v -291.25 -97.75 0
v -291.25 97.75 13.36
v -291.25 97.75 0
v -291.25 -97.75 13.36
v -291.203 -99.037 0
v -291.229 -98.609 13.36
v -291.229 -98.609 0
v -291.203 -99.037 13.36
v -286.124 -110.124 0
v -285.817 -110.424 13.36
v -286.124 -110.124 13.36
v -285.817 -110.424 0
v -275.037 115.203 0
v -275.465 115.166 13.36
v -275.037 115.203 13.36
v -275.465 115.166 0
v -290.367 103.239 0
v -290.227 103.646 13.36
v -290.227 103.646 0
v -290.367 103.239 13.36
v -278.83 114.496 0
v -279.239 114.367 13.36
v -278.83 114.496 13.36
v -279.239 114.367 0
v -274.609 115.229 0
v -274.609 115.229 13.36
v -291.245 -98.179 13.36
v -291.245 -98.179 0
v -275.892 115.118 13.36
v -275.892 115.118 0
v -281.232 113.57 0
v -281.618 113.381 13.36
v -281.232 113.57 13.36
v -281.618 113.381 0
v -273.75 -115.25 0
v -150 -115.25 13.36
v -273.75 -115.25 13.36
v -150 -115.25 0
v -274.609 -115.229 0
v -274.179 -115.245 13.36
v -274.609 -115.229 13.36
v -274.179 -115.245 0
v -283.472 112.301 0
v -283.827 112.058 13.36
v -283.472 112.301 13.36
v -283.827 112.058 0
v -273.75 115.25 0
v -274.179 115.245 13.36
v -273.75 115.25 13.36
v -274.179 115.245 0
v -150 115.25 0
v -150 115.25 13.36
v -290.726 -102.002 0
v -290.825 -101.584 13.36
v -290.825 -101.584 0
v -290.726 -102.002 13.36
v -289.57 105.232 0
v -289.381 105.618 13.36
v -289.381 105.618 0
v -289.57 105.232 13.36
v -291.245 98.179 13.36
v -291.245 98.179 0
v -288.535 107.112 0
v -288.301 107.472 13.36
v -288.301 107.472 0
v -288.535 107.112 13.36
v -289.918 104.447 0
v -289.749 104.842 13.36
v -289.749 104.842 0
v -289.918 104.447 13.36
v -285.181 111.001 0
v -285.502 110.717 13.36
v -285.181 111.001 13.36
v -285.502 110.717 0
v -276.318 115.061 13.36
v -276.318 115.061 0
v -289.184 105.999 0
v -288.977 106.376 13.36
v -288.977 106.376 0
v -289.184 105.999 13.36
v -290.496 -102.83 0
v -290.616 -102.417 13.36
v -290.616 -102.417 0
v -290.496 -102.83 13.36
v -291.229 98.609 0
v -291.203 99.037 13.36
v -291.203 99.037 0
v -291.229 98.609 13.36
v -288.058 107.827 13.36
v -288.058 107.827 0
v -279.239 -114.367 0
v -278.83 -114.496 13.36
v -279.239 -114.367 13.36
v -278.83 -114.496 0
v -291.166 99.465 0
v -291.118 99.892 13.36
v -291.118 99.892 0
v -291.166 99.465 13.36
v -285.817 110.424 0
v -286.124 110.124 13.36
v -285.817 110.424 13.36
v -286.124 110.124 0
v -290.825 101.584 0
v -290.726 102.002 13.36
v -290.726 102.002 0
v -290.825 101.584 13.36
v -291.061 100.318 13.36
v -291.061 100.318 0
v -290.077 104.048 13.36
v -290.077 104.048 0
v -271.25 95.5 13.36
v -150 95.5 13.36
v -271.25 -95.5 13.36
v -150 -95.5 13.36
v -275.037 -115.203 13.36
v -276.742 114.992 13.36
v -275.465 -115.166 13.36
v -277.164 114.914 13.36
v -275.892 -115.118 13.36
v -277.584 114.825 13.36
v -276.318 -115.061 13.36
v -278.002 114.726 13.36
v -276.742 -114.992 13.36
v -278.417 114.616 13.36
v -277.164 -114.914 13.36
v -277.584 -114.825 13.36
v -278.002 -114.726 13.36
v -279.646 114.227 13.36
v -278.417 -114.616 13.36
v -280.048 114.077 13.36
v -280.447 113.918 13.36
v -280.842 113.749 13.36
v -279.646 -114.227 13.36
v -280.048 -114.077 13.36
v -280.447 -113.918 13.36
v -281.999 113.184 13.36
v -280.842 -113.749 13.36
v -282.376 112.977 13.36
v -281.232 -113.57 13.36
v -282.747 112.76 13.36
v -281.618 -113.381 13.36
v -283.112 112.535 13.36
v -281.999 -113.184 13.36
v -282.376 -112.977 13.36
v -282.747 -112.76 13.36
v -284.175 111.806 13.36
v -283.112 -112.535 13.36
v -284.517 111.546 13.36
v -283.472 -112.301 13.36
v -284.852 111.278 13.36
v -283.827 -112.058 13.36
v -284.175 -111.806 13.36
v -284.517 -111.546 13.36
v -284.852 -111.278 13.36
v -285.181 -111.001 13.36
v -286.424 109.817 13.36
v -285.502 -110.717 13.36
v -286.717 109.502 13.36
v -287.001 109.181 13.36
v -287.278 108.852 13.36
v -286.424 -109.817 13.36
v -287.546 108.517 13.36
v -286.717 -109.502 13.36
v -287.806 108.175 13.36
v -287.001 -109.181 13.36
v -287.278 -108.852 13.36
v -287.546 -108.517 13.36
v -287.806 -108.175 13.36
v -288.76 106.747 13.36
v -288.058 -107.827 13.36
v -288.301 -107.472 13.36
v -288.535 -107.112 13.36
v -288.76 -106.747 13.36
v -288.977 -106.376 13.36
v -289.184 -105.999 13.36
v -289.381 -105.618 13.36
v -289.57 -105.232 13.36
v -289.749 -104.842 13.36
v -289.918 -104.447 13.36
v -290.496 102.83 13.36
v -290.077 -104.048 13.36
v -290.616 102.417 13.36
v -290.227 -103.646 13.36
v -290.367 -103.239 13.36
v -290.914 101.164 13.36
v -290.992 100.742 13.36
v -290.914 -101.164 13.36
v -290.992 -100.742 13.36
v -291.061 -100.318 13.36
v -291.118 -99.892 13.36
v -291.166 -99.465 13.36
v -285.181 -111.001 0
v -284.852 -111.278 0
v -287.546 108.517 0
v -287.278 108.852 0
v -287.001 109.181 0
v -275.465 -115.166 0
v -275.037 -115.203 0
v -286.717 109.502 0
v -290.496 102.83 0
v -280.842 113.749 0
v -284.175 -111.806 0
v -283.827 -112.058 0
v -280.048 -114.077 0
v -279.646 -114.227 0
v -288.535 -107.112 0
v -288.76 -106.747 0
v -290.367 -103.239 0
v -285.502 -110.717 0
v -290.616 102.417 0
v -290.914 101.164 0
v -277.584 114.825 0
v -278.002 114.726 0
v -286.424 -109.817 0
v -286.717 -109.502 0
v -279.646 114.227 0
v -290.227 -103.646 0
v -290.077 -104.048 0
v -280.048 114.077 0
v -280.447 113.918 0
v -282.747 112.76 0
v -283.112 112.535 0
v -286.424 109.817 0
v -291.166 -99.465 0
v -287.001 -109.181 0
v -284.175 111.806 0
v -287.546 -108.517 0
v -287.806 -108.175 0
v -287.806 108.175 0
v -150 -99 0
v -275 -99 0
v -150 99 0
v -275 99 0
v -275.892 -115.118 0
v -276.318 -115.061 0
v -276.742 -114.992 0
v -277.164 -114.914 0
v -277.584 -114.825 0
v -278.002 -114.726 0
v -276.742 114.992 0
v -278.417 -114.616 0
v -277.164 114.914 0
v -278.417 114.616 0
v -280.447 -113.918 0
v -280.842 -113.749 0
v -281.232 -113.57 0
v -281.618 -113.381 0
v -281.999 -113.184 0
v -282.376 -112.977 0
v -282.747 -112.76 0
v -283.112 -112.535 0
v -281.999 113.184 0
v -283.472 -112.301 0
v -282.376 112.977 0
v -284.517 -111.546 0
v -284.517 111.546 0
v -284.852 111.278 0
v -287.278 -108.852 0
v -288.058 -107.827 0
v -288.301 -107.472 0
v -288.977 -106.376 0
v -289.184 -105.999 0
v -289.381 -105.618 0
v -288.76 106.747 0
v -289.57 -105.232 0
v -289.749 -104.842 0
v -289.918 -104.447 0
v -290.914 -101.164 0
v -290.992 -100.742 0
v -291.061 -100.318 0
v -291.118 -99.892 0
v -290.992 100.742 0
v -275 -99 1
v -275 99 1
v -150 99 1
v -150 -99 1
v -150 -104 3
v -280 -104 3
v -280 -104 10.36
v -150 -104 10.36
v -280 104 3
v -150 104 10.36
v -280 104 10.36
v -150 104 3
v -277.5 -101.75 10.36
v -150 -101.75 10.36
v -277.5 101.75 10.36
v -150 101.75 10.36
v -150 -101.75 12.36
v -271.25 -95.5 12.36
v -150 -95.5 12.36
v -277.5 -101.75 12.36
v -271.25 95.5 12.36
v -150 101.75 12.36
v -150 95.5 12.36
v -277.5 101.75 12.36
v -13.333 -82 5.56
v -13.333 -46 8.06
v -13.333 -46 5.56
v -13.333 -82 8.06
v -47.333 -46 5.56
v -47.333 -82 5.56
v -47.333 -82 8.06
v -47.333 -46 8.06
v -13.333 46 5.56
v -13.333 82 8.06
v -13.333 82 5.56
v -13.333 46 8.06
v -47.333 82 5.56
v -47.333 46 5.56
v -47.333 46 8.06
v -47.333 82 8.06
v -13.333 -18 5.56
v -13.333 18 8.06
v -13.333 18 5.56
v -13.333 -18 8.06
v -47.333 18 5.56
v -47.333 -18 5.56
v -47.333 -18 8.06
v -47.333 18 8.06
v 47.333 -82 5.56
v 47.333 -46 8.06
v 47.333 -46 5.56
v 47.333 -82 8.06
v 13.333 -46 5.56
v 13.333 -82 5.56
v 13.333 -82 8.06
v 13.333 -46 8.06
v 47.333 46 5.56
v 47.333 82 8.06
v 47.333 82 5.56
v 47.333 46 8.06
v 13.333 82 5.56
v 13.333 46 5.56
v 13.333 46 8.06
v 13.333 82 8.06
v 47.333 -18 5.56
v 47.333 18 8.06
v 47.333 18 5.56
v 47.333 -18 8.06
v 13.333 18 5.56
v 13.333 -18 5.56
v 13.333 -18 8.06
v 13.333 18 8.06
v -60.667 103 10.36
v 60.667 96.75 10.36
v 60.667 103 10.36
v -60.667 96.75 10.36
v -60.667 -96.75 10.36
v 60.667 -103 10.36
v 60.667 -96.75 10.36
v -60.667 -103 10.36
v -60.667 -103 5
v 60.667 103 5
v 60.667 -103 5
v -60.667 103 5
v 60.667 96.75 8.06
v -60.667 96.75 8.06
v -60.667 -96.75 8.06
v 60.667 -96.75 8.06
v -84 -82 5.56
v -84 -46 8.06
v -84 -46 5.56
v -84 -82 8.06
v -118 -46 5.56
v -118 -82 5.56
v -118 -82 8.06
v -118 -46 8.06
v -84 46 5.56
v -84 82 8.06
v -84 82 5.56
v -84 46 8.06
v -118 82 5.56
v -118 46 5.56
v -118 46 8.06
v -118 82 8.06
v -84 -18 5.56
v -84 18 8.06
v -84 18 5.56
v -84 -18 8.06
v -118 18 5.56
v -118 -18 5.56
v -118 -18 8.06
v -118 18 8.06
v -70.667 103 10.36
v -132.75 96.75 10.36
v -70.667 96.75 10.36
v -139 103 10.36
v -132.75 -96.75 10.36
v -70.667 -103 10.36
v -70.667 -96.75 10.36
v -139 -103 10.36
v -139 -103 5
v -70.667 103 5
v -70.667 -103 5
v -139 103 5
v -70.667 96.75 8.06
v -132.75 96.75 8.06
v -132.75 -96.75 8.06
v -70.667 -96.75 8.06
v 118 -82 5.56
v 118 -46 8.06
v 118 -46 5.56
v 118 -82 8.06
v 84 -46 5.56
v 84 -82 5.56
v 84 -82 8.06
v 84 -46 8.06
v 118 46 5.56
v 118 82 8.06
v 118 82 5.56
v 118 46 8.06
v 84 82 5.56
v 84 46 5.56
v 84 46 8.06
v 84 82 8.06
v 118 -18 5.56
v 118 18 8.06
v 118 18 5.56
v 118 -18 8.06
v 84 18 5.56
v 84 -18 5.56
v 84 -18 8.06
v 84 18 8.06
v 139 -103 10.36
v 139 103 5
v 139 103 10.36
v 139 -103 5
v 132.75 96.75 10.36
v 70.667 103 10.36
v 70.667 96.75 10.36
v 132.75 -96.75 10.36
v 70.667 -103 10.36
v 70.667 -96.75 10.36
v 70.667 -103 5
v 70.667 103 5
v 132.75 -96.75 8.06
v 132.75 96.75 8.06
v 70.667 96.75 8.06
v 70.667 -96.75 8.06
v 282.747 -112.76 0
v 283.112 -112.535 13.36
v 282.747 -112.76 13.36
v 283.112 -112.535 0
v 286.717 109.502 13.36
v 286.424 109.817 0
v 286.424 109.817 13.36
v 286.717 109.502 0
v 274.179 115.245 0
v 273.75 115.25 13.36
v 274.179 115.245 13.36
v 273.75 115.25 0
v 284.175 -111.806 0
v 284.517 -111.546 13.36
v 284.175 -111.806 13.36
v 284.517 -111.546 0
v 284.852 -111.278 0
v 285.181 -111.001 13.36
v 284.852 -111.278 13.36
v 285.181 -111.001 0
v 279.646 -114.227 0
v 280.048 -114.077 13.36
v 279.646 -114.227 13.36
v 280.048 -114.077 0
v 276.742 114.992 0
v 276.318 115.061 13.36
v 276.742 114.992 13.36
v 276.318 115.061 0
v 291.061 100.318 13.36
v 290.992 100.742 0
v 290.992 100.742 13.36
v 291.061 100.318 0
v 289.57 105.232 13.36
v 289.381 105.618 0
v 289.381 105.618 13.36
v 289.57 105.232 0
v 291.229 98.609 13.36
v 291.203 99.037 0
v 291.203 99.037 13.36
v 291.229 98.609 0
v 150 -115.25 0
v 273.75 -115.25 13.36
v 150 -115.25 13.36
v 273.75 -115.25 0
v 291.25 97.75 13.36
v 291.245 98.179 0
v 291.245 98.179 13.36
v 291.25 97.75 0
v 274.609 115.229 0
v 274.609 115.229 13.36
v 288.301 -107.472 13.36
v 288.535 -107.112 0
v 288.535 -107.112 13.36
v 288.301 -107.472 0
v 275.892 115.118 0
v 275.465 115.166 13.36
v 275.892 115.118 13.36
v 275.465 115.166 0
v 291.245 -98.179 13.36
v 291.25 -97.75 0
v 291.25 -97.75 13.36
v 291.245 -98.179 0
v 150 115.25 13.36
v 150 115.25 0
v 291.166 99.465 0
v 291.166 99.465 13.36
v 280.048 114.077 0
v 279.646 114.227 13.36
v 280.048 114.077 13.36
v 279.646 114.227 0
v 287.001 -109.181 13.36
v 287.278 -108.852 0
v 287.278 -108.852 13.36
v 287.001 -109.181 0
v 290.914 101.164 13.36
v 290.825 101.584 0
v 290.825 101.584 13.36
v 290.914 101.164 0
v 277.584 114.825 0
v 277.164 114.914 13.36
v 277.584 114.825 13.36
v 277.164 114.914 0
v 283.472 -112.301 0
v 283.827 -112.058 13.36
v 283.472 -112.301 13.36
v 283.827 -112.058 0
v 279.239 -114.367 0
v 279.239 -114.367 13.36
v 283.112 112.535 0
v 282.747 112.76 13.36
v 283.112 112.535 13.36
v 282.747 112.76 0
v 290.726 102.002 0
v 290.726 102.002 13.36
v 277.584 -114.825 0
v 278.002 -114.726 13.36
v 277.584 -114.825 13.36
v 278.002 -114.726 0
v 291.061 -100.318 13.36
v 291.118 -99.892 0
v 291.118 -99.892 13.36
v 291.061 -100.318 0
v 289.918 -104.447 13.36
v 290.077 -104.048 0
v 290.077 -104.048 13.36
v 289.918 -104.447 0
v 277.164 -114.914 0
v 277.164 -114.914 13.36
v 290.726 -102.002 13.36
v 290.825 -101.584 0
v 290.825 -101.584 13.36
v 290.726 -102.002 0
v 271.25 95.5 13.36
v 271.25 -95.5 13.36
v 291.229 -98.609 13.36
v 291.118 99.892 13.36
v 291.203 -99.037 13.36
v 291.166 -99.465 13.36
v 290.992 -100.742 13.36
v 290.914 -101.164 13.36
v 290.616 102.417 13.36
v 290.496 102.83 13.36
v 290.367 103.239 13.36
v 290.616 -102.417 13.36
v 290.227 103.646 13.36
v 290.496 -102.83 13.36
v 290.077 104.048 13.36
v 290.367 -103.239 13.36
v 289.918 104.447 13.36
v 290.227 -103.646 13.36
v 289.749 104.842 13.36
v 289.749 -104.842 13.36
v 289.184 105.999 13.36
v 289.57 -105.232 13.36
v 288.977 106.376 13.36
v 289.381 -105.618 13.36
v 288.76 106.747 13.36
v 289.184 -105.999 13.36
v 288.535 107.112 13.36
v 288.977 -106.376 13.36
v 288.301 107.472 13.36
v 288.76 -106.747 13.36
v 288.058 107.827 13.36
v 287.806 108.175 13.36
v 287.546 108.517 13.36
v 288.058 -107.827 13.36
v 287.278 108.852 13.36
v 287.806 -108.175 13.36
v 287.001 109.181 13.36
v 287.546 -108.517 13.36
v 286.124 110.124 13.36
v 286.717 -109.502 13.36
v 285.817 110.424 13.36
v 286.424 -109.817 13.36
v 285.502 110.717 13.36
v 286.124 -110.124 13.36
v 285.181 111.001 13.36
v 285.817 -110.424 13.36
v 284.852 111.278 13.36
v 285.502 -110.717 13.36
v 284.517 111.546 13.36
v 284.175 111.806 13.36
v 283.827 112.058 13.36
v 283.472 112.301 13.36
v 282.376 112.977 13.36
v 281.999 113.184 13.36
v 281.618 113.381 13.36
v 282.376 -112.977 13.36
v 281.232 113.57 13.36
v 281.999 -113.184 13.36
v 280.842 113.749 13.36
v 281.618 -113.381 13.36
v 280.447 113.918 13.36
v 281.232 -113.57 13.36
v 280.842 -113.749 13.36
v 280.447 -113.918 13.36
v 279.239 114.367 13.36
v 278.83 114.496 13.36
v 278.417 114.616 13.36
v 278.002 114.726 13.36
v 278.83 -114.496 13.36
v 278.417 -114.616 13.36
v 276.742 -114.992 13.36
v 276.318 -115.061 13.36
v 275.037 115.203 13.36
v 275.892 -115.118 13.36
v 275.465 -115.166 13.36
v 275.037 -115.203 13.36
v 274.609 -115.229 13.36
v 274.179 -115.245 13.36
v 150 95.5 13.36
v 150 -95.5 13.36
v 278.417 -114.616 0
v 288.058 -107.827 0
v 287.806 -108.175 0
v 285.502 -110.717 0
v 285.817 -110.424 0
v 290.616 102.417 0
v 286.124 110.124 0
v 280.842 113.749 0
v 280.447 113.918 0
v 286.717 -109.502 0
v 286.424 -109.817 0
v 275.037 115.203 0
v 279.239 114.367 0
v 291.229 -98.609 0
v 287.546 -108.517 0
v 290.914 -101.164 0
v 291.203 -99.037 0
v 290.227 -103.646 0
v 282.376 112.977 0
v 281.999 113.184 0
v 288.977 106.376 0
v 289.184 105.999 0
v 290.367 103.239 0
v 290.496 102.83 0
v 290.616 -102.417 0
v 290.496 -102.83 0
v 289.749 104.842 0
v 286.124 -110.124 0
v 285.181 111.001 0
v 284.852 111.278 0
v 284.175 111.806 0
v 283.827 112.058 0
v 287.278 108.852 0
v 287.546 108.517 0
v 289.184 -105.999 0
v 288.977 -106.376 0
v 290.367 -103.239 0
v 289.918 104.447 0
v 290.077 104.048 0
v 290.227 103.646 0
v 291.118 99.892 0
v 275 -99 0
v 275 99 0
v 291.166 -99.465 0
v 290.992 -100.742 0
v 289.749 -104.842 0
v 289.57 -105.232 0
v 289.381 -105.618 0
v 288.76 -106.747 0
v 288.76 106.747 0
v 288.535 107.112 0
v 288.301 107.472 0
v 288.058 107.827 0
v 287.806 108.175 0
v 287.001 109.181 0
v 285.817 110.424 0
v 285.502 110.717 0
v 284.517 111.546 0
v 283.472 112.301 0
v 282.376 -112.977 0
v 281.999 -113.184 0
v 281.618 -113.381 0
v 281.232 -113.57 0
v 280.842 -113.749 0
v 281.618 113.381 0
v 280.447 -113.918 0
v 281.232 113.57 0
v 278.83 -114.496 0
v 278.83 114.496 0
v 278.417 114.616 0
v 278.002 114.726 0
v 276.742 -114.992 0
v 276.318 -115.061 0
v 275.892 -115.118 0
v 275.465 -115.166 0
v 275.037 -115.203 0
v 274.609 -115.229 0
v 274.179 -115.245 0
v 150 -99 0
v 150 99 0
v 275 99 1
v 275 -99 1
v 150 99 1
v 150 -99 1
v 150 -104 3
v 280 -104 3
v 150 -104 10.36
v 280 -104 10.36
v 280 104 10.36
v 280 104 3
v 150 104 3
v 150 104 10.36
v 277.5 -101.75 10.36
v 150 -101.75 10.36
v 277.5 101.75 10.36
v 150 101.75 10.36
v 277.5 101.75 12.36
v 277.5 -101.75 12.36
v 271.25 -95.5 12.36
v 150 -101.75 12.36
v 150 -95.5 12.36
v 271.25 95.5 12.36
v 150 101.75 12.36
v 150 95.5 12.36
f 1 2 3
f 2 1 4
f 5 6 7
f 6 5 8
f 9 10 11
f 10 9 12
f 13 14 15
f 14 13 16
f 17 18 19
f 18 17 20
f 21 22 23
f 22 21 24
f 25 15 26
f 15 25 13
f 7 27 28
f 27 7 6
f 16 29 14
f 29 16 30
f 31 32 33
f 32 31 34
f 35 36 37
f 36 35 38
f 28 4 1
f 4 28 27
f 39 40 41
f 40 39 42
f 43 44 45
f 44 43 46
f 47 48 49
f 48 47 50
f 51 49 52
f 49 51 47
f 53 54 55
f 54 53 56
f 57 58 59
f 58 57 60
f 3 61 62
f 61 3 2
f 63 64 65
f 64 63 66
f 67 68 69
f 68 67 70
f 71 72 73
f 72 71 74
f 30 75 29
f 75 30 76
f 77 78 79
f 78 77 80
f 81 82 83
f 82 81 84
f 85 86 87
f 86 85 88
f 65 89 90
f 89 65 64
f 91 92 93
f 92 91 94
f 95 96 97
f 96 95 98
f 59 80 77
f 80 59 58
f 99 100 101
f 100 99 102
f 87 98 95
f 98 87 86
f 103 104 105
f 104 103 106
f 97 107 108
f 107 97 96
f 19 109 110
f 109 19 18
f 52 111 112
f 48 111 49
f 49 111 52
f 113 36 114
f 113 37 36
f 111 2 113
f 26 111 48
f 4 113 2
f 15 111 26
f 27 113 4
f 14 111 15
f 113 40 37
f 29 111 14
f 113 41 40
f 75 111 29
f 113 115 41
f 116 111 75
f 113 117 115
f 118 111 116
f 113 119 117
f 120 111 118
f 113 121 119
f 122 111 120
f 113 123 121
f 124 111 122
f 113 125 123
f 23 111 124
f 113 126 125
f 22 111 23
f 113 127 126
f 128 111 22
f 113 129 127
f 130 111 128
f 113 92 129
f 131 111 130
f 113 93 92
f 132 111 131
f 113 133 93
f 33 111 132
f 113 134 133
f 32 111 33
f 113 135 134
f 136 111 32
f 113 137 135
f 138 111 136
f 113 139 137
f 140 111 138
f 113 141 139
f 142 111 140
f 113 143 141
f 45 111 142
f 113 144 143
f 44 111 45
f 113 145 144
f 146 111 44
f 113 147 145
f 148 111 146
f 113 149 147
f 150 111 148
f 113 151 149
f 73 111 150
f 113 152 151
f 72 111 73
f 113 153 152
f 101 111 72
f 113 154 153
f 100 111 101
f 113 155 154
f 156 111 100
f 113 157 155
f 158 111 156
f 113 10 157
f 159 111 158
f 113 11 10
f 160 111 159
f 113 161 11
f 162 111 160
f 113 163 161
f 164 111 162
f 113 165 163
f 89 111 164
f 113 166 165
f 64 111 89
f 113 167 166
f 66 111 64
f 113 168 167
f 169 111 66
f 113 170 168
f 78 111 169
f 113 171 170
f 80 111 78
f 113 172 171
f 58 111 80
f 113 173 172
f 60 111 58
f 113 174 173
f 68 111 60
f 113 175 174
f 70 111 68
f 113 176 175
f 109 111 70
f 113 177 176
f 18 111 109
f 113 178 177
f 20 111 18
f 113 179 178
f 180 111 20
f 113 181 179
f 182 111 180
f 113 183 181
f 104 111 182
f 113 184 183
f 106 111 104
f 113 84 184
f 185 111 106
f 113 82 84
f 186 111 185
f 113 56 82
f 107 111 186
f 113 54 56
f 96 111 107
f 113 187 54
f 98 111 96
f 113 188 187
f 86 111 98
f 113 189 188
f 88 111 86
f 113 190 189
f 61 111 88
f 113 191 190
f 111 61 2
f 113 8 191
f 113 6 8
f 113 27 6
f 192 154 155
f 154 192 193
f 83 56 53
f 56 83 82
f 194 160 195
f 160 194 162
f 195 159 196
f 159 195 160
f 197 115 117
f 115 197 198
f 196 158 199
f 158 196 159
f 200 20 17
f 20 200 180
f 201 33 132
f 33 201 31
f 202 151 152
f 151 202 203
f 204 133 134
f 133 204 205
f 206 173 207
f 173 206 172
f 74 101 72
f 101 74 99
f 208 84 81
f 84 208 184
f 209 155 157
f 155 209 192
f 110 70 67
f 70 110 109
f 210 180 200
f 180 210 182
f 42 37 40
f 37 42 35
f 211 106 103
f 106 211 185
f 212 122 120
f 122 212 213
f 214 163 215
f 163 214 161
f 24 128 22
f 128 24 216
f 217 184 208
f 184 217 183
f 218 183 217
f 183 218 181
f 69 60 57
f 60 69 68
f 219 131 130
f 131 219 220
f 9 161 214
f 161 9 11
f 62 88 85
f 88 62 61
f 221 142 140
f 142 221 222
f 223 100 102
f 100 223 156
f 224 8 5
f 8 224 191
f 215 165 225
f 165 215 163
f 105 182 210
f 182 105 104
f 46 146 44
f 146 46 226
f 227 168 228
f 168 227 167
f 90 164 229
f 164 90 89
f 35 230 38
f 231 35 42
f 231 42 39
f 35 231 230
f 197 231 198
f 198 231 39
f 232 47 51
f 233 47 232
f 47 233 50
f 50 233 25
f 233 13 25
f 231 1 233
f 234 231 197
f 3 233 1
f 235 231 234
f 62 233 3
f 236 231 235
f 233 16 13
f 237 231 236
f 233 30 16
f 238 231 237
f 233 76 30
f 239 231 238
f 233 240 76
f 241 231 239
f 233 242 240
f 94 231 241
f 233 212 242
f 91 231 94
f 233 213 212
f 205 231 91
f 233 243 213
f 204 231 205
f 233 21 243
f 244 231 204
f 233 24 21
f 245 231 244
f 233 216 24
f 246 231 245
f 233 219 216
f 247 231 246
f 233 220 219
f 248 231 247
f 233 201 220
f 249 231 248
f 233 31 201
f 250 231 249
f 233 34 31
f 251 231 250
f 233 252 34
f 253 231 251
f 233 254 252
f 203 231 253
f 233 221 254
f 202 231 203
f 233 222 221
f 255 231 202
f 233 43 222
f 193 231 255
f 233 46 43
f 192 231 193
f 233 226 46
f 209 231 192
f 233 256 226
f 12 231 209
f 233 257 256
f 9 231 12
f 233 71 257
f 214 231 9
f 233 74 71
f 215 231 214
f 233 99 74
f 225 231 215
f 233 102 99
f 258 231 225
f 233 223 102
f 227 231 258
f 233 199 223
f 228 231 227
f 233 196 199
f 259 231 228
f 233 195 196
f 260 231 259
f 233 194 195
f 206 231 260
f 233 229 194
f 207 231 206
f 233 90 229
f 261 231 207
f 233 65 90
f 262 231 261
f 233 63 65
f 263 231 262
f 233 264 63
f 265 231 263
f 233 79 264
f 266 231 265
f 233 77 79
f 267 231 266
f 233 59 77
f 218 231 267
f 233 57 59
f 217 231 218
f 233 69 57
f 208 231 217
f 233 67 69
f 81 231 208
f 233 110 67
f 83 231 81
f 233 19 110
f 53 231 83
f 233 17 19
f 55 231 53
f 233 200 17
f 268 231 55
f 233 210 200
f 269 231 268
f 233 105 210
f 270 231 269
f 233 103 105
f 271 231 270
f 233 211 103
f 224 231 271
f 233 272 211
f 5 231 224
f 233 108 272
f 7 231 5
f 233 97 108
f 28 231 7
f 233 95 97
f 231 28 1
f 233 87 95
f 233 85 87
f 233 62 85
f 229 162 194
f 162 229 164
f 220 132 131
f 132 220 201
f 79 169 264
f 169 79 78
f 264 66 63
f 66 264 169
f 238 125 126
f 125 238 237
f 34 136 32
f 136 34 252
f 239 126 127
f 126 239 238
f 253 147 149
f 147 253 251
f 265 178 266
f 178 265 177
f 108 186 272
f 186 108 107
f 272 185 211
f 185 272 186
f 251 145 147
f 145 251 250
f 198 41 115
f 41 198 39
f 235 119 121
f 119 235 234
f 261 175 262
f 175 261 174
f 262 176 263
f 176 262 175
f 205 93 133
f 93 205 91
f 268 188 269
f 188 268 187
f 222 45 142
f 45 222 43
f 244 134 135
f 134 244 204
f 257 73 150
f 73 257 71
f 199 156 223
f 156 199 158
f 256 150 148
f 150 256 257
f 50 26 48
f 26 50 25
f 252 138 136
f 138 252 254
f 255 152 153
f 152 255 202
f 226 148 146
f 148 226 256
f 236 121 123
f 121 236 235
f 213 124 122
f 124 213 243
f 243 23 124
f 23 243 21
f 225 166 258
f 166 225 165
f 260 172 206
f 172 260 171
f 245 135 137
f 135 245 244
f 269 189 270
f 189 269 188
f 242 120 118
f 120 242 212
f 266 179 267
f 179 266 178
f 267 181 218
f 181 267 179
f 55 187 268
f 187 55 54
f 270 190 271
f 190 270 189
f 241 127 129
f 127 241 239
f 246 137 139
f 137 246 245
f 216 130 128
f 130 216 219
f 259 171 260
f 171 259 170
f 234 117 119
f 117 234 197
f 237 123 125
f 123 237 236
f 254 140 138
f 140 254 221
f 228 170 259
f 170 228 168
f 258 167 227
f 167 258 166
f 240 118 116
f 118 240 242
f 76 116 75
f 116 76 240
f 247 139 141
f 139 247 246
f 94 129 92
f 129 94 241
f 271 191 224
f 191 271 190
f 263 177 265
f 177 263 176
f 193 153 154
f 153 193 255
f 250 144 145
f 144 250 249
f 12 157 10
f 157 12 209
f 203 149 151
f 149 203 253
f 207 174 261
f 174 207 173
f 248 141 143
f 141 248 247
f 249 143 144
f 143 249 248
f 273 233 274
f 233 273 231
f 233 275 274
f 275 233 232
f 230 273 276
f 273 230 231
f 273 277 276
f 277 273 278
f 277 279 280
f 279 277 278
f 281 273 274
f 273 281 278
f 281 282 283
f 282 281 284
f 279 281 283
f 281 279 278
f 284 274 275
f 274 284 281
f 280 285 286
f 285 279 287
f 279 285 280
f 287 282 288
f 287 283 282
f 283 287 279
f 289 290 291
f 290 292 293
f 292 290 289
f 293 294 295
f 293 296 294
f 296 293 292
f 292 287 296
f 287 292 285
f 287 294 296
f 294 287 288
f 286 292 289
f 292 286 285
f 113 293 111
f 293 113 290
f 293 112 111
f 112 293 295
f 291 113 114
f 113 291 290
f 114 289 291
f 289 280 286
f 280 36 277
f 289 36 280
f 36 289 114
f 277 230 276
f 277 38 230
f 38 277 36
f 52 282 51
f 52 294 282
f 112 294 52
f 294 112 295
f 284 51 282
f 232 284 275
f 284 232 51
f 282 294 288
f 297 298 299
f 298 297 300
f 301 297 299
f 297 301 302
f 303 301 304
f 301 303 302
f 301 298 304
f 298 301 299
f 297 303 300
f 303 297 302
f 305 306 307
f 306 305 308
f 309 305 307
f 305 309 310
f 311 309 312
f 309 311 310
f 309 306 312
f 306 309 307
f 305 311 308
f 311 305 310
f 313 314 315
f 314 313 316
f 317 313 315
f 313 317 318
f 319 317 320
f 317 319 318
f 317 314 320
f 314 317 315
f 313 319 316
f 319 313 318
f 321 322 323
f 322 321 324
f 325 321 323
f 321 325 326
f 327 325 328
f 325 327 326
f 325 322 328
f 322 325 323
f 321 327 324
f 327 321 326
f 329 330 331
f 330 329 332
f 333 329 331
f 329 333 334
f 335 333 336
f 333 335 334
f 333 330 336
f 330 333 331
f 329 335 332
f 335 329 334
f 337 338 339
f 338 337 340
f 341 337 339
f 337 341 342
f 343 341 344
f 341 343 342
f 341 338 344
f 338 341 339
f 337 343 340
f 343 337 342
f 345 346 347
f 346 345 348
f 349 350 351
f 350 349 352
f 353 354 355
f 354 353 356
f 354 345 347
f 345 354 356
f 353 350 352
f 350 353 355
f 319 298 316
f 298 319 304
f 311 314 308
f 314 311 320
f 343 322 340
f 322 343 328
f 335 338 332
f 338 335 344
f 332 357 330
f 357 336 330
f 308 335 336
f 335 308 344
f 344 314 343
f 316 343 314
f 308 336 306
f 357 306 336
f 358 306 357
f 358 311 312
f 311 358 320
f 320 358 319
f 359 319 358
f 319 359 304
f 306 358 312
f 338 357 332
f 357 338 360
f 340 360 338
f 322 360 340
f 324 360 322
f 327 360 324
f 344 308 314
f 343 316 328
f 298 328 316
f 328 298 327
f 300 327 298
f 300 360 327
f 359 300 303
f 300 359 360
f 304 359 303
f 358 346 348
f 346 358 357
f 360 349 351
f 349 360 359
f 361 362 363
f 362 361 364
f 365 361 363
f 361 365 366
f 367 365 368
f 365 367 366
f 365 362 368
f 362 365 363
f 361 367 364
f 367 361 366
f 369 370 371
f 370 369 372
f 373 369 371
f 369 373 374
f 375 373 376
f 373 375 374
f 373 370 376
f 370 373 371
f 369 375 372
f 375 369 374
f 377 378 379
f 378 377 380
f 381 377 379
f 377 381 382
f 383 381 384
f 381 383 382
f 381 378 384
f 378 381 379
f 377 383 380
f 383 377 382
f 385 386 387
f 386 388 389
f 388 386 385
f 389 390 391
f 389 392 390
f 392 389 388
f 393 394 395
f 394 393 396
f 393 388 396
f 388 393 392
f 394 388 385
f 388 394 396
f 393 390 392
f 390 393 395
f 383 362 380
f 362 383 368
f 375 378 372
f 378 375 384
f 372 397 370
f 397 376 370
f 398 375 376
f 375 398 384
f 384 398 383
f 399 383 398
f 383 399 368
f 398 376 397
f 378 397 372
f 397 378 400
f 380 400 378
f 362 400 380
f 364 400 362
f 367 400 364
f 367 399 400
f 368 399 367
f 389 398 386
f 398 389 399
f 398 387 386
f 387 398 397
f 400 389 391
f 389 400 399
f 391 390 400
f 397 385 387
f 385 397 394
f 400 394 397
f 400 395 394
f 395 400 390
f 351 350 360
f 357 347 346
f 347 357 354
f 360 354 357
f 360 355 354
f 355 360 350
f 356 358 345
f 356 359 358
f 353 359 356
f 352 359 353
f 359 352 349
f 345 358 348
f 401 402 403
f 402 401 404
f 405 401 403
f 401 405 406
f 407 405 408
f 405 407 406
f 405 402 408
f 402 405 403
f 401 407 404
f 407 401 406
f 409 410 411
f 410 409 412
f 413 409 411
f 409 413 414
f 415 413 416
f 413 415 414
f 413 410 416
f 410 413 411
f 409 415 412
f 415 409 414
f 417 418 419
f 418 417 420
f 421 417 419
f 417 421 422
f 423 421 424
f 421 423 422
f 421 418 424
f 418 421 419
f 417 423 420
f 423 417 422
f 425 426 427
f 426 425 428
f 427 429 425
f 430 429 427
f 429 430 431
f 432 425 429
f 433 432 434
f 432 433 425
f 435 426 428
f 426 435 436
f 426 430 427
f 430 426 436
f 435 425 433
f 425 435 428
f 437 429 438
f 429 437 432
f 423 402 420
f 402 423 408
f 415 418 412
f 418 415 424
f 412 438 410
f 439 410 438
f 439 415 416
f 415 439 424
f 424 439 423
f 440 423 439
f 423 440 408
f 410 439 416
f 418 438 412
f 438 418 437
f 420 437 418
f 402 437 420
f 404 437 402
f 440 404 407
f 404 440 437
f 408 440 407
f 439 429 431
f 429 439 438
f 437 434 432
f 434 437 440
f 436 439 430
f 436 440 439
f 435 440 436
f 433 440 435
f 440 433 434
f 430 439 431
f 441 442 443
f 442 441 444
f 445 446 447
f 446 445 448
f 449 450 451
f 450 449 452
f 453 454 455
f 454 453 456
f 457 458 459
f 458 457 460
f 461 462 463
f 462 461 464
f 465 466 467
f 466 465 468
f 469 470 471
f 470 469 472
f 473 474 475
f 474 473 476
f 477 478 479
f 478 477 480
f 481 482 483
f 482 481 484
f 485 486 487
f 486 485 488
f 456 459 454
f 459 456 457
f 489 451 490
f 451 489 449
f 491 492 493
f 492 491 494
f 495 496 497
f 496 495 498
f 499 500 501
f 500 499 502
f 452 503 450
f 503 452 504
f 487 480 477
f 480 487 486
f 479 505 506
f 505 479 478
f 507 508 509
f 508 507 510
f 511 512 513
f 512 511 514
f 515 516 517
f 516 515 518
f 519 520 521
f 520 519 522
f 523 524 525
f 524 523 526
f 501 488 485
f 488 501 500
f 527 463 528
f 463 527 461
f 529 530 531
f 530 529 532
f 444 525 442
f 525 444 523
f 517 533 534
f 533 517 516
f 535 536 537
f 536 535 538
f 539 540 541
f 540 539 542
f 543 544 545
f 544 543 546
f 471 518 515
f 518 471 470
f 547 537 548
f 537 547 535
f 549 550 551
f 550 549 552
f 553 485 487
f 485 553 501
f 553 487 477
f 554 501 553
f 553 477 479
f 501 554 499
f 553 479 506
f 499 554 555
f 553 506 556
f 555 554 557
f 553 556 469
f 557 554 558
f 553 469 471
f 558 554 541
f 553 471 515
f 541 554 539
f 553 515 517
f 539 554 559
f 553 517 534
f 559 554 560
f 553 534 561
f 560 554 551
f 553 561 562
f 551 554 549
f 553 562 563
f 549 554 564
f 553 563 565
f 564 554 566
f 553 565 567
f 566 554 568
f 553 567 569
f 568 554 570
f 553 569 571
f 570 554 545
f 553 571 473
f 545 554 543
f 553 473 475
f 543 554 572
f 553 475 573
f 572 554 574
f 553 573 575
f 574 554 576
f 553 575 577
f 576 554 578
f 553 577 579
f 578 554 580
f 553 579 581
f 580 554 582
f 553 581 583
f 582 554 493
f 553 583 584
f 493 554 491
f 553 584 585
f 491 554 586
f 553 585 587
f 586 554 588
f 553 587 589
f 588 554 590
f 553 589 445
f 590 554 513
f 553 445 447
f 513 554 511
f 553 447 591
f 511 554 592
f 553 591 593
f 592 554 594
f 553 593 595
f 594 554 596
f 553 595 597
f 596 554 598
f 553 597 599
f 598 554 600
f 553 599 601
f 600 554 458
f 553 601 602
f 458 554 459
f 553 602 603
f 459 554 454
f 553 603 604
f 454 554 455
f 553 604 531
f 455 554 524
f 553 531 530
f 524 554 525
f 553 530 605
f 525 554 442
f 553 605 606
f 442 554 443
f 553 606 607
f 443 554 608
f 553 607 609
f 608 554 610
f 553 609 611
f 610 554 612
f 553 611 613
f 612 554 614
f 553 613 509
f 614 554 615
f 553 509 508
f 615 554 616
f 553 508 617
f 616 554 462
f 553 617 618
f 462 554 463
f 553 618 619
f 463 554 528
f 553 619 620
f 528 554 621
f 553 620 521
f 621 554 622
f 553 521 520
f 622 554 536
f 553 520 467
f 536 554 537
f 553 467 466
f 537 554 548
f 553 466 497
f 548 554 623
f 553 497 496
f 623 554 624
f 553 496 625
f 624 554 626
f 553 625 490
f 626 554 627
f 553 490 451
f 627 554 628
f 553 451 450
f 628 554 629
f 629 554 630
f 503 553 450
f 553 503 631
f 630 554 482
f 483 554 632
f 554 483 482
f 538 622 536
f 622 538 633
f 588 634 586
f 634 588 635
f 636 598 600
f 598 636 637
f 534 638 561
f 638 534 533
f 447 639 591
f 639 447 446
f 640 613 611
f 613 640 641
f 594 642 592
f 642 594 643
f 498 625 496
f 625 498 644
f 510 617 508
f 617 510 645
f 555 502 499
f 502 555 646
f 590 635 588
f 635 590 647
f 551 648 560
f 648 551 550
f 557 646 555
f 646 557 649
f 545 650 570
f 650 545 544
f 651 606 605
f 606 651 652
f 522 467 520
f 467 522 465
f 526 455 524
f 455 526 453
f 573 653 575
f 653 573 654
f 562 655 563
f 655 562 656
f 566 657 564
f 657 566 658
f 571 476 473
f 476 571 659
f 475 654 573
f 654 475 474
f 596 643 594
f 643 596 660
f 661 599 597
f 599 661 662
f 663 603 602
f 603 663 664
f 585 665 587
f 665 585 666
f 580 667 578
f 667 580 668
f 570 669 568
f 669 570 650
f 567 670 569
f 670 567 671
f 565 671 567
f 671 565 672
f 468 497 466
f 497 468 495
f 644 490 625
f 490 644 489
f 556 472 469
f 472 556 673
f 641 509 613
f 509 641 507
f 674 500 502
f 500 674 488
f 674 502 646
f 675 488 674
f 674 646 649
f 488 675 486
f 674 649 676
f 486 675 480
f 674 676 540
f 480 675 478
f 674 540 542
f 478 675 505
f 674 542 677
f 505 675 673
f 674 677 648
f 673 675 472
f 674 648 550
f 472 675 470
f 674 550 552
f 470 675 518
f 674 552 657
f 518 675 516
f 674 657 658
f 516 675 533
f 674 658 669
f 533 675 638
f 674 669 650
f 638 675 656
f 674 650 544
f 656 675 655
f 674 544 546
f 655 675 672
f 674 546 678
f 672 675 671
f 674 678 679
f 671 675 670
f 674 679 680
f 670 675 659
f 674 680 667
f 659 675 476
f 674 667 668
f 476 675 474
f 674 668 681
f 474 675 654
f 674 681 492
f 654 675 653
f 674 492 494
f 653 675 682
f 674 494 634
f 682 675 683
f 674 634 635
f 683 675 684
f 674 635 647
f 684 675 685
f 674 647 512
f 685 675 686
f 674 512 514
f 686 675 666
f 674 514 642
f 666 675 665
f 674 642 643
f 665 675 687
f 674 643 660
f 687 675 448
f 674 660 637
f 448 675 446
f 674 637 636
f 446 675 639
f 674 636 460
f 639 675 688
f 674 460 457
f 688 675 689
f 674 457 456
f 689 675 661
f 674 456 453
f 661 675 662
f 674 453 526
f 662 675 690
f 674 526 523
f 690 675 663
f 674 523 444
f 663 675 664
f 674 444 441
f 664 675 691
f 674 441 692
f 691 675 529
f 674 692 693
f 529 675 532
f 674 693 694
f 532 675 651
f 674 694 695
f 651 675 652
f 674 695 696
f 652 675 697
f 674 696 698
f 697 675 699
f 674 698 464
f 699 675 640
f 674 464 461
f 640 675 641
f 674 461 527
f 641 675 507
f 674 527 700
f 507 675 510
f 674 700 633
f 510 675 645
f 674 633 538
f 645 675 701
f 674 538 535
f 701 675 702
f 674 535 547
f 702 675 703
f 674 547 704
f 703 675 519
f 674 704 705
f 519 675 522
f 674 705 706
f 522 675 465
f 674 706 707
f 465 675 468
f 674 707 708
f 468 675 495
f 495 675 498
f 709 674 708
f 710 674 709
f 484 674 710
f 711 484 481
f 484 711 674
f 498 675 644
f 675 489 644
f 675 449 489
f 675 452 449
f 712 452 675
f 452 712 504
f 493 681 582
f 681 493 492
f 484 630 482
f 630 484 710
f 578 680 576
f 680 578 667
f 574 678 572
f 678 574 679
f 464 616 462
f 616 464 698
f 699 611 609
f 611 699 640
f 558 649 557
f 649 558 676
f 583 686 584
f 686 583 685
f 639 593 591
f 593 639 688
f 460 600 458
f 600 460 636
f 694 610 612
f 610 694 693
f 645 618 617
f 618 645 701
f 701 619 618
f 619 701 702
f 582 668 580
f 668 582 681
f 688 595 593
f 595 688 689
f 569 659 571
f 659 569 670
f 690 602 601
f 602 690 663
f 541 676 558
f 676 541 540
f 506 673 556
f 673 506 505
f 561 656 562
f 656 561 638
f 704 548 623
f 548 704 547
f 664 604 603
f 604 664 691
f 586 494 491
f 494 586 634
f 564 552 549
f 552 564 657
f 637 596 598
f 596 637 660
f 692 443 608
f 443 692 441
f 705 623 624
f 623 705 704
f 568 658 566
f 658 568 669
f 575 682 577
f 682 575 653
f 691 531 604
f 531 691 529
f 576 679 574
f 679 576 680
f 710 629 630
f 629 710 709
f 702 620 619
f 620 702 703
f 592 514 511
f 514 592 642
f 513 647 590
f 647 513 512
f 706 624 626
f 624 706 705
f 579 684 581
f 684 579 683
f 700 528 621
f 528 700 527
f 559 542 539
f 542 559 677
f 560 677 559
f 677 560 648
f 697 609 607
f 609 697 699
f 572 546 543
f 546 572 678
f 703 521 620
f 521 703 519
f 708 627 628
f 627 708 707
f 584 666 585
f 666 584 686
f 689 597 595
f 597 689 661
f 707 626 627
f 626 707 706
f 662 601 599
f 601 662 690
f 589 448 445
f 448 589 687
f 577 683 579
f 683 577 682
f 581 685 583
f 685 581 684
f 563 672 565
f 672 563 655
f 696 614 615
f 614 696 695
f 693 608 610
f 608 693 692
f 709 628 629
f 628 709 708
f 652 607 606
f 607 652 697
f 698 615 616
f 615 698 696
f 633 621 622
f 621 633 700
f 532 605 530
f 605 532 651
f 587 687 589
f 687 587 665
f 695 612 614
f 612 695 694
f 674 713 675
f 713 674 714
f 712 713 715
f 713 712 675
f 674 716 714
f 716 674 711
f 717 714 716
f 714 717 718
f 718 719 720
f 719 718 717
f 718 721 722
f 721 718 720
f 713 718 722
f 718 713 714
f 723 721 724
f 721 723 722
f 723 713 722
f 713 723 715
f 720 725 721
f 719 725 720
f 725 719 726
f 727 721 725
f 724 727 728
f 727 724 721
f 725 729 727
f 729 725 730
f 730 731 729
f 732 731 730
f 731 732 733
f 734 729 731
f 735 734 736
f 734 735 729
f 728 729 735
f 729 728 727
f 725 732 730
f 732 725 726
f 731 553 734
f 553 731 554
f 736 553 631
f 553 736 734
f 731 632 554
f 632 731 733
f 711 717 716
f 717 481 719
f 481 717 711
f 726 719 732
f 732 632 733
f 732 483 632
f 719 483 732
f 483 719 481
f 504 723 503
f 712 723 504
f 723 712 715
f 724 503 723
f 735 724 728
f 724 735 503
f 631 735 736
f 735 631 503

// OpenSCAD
// file: ../inlays/nintendo_game_boy_cartridge_c_inlay.scad
use <../../utilities/dictionary_get.scad>;

function nintendo_game_boy_cartridge_c_inlay_embed_width_mm() = 57.5;
function nintendo_game_boy_cartridge_c_inlay_embed_height_mm() = 66.25;

/**
 * A Nintendo Game Boy cartridge which does NOT have a notch in the top right
 * corner, compatible with the CGB, AGB and AGS models.
 * @param An array representing a dictionary, containing:
 *        - origin
 *          - x_mm - The origin of the inlay on the X axis, in millimeters.
 *          - y_mm - The origin of the inlay on the Y axis, in millimeters.
 * @return An array describing the inlay.
 */
function nintendo_game_boy_cartridge_c_inlay(settings) =
  let (origin = dictionary_get(settings, "origin"))
  let (origin_x_mm = dictionary_get(origin, "x_mm"))
  let (origin_y_mm = dictionary_get(origin, "y_mm"))
  [
    ["type", "nintendo_game_boy_cartridge_c"],
    [
      "origin",
      [
        ["x_mm", origin_x_mm],
        ["y_mm", origin_y_mm],
      ],
    ],
  ];

module nintendo_game_boy_cartridge_c_inlay(settings, inlay, embed_depth_mm) {
  translate([
    nintendo_game_boy_cartridge_c_inlay_embed_width_mm() / -2,
    nintendo_game_boy_cartridge_c_inlay_embed_height_mm() / -2,
    -embed_depth_mm,
  ]) {
    cube([
      nintendo_game_boy_cartridge_c_inlay_embed_width_mm(),
      nintendo_game_boy_cartridge_c_inlay_embed_height_mm(),
      embed_depth_mm,
    ]);
  };
};
// file: ../inlays/nintendo_game_boy_cartridge_a_or_b_inlay.scad
use <../../utilities/dictionary_get.scad>;

width_mm = 58;
height_mm = 66;

notch_width_mm = 5.175;
notch_height_mm = 3;

retainer_width_mm = 51;
retainer_depth_offset_mm = 1.5;
retainer_height_mm = 3;

/**
 * A Nintendo Game Boy cartridge which has a notch in the top right corner,
 * compatible with the DMG, MGB, CGB, AGB and AGS models.
 * @param An array representing a dictionary, containing:
 *        - origin
 *          - x_mm - The origin of the inlay on the X axis, in millimeters.
 *          - y_mm - The origin of the inlay on the Y axis, in millimeters.
 * @return An array describing the inlay.
 */
function nintendo_game_boy_cartridge_a_or_b_inlay(settings) =
  let (origin = dictionary_get(settings, "origin"))
  let (origin_x_mm = dictionary_get(origin, "x_mm"))
  let (origin_y_mm = dictionary_get(origin, "y_mm"))
  [
    ["type", "nintendo_game_boy_cartridge_a_or_b"],
    [
      "origin",
      [
        ["x_mm", origin_x_mm],
        ["y_mm", origin_y_mm],
      ],
    ],
  ];

module nintendo_game_boy_cartridge_a_or_b_inlay(settings, inlay, embed_depth_mm) {
  difference() {
    translate([0, 0, -embed_depth_mm]) {
      linear_extrude(embed_depth_mm) {
        difference() {
          translate([width_mm / -2, height_mm / -2]) {
            square([width_mm, height_mm]);
          };

          translate([
            width_mm / 2 - notch_width_mm,
            height_mm / 2 - notch_height_mm,
          ]) {
            square([notch_width_mm, notch_height_mm]);
          };
        };
      };
    };

    translate([
      retainer_width_mm / -2,
      height_mm / -2,
      retainer_depth_offset_mm - embed_depth_mm,
    ]) {
      rotate([0, 90, 0]) {
        linear_extrude(retainer_width_mm) {
          polygon([
            [0, 0],
            [retainer_depth_offset_mm - embed_depth_mm, retainer_height_mm],
            [retainer_depth_offset_mm - embed_depth_mm, 0],
          ]);
        };
      };
    };
  };
};
// file: ../utilities/settings.scad
/**
 * The number of millimeters that the glazing lip overlaps the glazing.
 */
function glazing_lip_thickness_mm() = 6.25;

/**
 * The depth of the glazing lip, in millimeters.
 */
function glazing_lip_depth_mm() = 1;

/**
 * The number of millimeters that the backing lip overlaps the backing.
 */
function backing_lip_thickness_mm() = 5;

/**
 * The depth of the backing lip, in millimeters.
 */
function backing_lip_depth_mm() = 3;

/**
 * The depth of slope to the backing lip, in millimeters.
 */
function backing_lip_slope_depth_mm() = 2;

/**
 * The minimum depth of the inlay layer, in millimeters.
 */
function inlay_bottom_depth_mm() = 0.56;

/**
 * The gap between the bottom of the glazing and the top of the displayed items,
 * in millimeters.
 */
function inlay_top_clearance_mm() = 1;

/**
 * The tolerance each side of the inlay in millimeters.
 */
function inlay_side_tolerance_mm() = 1;
// file: ../utilities/inlay_protrusion_depth_mm.scad
use <../../utilities/dictionary_get.scad>;

/**
 * Given an inlay, determines the depth (in millimeters) to which the inlay
 * should protrude from the frame.
 * @param inlay The inlay to measure.
 * @return      The depth (in millimeters) to which the inlay should protrude
 *              from the frame.
 */
function inlay_protrusion_depth_mm(inlay) = dictionary_get
(
  [
    ["nintendo_3ds_game_card", 1.3],
    ["nintendo_ds_game_card", 1.3],
    ["nintendo_game_boy_cartridge", 4],
    ["nintendo_game_boy_cartridge_c", 5],
  ],
  dictionary_get(inlay, "type")
);
// file: ../utilities/inlay_embed_depth_mm.scad
use <../../utilities/dictionary_get.scad>;

/**
 * Given an inlay, determines the depth (in millimeters) to which the inlay
 * should embed into the frame.
 * @param inlay The inlay to measure.
 * @return      The depth (in millimeters) to which the inlay should embed into
 *              the frame.
 */
function inlay_embed_depth_mm(inlay) = dictionary_get
(
  [
    ["nintendo_3ds_game_card", 2.5],
    ["nintendo_ds_game_card", 2.5],
    ["nintendo_game_boy_cartridge", 4],
    ["nintendo_game_boy_cartridge_c", 4],
  ],
  dictionary_get(inlay, "type")
);
// file: ../../utilities/dictionary_get.scad
/**
 * Retrieves a value by its key from an array representing a dictionary.
 * @param dictionary An array representing a dictionary.  Its contents must be
 *                   two-item arrays, each containing a key, then a value.
 * @param key        The key of the value to retrieve.
 * @return           The value matching the specified key.
 * @throws           When the key is not in the dictionary.
 * @throws           When the key is present in the dictionary multiple times.
 */
function dictionary_get(dictionary, key) =
  assert(
    len([for (item = dictionary) if (item[0] == key) item]) >= 1,
    "The given key was not found in the given dictionary"
  )
  assert(
    len([for (item = dictionary) if (item[0] == key) item]) <= 1,
    "The given key was found multiple times in the given dictionary"
  )
  [for (item = dictionary) if (item[0] == key) item][0][1];
// file: ../../utilities/slice_y.scad
module slice_y(bottom, top) {
  intersection() {
    translate([
      -10000,
      bottom,
      -10000,
    ]) {
      cube([
        20000,
        top - bottom,
        20000,
      ]);
    };

    children();
  };
};
// file: ../../utilities/slice_x.scad
module slice_x(left, right) {
  intersection() {
    translate([
      left,
      -10000,
      -10000,
    ]) {
      cube([
        right - left,
        20000,
        20000,
      ]);
    };

    children();
  };
};
// file: ../inlays/nintendo_ds_game_card_inlay.scad
use <../../utilities/dictionary_get.scad>;

function nintendo_ds_game_card_inlay_width_mm() = 34;
function nintendo_ds_game_card_inlay_height_mm() = 36;

/**
 * A Nintendo DS game card (without the Nintendo 3DS tab).  Compatible with the
 * SPR, CTR, FTR, TWL and UTL models (and the un-codenamed "New 3DS" range).
 * Likely compatible with the USG and NTR models.
 * @param An array representing a dictionary, containing:
 *        - origin
 *          - x_mm - The origin of the inlay on the X axis, in millimeters.
 *          - y_mm - The origin of the inlay on the Y axis, in millimeters.
 * @return An array describing the inlay.
 */
function nintendo_ds_game_card_inlay(settings) =
  let (origin = dictionary_get(settings, "origin"))
  let (origin_x_mm = dictionary_get(origin, "x_mm"))
  let (origin_y_mm = dictionary_get(origin, "y_mm"))
  [
    ["type", "nintendo_ds_game_card"],
    [
      "origin",
      [
        ["x_mm", origin_x_mm],
        ["y_mm", origin_y_mm],
      ],
    ],
  ];
// file: ../borders/rounded_flat_border.scad
use <../../utilities/dictionary_get.scad>;

/**
 * A rounded flat border.
 * @param An array representing a dictionary, containing:
 *        - thickness_mm - The thickness of the frame in millimeters.
 *        - sides        - The number of sides per corner.
 * @return An array describing the border.
 */
function rounded_flat_border(settings) =
  let (thickness_mm = dictionary_get(settings, "thickness_mm"))
  let (sides = dictionary_get(settings, "sides"))
  [
    ["type", "rounded_flat"],
    ["thickness_mm", thickness_mm],
    ["sides", sides],
  ];
// file: ../backings/a4_backing.scad
/**
 * Measurements taken from a B&M "New York" frame.
 */
function a4_backing() = [
  ["width_mm", 260],
  ["height_mm", 208],
  ["depth_mm", 2],
];
// file: ../glazings/a4_glazing.scad
/**
 * Measurements taken from a B&M "New York" frame.
 */
function a4_glazing() = [
  ["width_mm", 255],
  ["height_mm", 203.5],
  ["depth_mm", 2],
];
// file: ../inlay.scad
use <../utilities/dictionary_get.scad>;
use <inlays/nintendo_ds_game_card_inlay.scad>;
use <inlays/nintendo_game_boy_cartridge_a_or_b_inlay.scad>;
use <inlays/nintendo_game_boy_cartridge_c_inlay.scad>;
use <utilities/inlay_embed_depth_mm.scad>;
use <utilities/inlay_protrusion_depth_mm.scad>;
use <utilities/settings.scad>;

module inlay(settings) {
  glazing = dictionary_get(settings, "glazing");
  glazing_width_mm = dictionary_get(glazing, "width_mm");
  glazing_height_mm = dictionary_get(glazing, "height_mm");

  backing = dictionary_get(settings, "backing");
  backing_width_mm = dictionary_get(backing, "width_mm");
  backing_height_mm = dictionary_get(backing, "height_mm");
  backing_depth_mm = dictionary_get(backing, "depth_mm");

  inlays = dictionary_get(settings, "inlays");

  greatest_inlay_embed_depth_mm = max([ for (inlay = inlays) inlay_embed_depth_mm(inlay) ]);
  greatest_inlay_protrusion_depth_mm = max([ for (inlay = inlays) inlay_protrusion_depth_mm(inlay) ]);

  inlay_width_mm = max(glazing_width_mm, backing_width_mm) - inlay_side_tolerance_mm() * 2;
  inlay_height_mm = max(glazing_height_mm, backing_height_mm) - inlay_side_tolerance_mm() * 2;

  difference() {
    translate([
      inlay_width_mm / -2,
      inlay_height_mm / -2,
      backing_lip_depth_mm()
        + backing_depth_mm,
    ]) {
      cube([
        inlay_width_mm,
        inlay_height_mm,
        inlay_bottom_depth_mm()
          + greatest_inlay_embed_depth_mm
          + greatest_inlay_protrusion_depth_mm
          + inlay_top_clearance_mm(),
      ]);
    };

    translate([
      inlay_width_mm / -2 + glazing_lip_thickness_mm(),
      inlay_height_mm / -2 + glazing_lip_thickness_mm(),
      backing_lip_depth_mm()
        + backing_depth_mm
        + inlay_bottom_depth_mm()
        + greatest_inlay_embed_depth_mm,
    ]) {
      cube([
        inlay_width_mm - glazing_lip_thickness_mm() * 2,
        inlay_height_mm - glazing_lip_thickness_mm() * 2,
        greatest_inlay_protrusion_depth_mm + inlay_top_clearance_mm(),
      ]);
    };

    translate([
      0,
      0,
      backing_lip_depth_mm()
        + backing_depth_mm
        + inlay_bottom_depth_mm()
        + greatest_inlay_embed_depth_mm,
    ]) {
      for (inlay = inlays) {
        inlay_type = dictionary_get(inlay, "type");

        embed_depth_mm = inlay_embed_depth_mm(inlay);

        origin = dictionary_get(inlay, "origin");

        origin_x_mm = dictionary_get(origin, "x_mm");
        origin_y_mm = dictionary_get(origin, "y_mm");

        translate([
          origin_x_mm,
          origin_y_mm,
          0,
        ]) {
          if (inlay_type == "nintendo_game_boy_cartridge_a_or_b") {
            nintendo_game_boy_cartridge_a_or_b_inlay(settings, inlay, embed_depth_mm);
          } else if (inlay_type == "nintendo_game_boy_cartridge_c") {
            nintendo_game_boy_cartridge_c_inlay(settings, inlay, embed_depth_mm);
          } else if (inlay_type == "nintendo_ds_game_card") {
            translate([
              nintendo_ds_game_card_inlay_width_mm() / -2,
              nintendo_ds_game_card_inlay_height_mm() / -2,
              -embed_depth_mm,
            ]) {
              cube([
                nintendo_ds_game_card_inlay_width_mm(),
                nintendo_ds_game_card_inlay_height_mm(),
                embed_depth_mm,
              ]);
            };
          } else {
            assert(false, "Unexpected inlay type");
          };
        };
      };
    };
  };
};
// file: ../frame.scad
use <../utilities/dictionary_get.scad>;
use <utilities/inlay_embed_depth_mm.scad>;
use <utilities/inlay_protrusion_depth_mm.scad>;
use <utilities/settings.scad>;

module frame(settings) {
  glazing = dictionary_get(settings, "glazing");
  glazing_width_mm = dictionary_get(glazing, "width_mm");
  glazing_height_mm = dictionary_get(glazing, "height_mm");
  glazing_depth_mm = dictionary_get(glazing, "depth_mm");

  backing = dictionary_get(settings, "backing");
  backing_width_mm = dictionary_get(backing, "width_mm");
  backing_height_mm = dictionary_get(backing, "height_mm");
  backing_depth_mm = dictionary_get(backing, "depth_mm");

  border = dictionary_get(settings, "border");
  border_type = dictionary_get(border, "type");
  border_thickness_mm = dictionary_get(border, "thickness_mm");

  inlays = dictionary_get(settings, "inlays");

  greatest_inlay_embed_depth_mm = max([ for (inlay = inlays) inlay_embed_depth_mm(inlay) ]);
  greatest_inlay_protrusion_depth_mm = max([ for (inlay = inlays) inlay_protrusion_depth_mm(inlay) ]);

  inlay_width_mm = max(glazing_width_mm, backing_width_mm);
  width_mm = inlay_width_mm + border_thickness_mm * 2 - glazing_lip_thickness_mm() * 2;
  inlay_height_mm = max(glazing_height_mm, backing_height_mm);
  height_mm = inlay_height_mm + border_thickness_mm * 2 - glazing_lip_thickness_mm() * 2;
  depth_mm =
    backing_lip_depth_mm()
    + backing_depth_mm
    + inlay_bottom_depth_mm()
    + greatest_inlay_embed_depth_mm
    + greatest_inlay_protrusion_depth_mm
    + inlay_top_clearance_mm()
    + glazing_depth_mm
    + glazing_lip_depth_mm();

  difference() {
    if (border_type == "square") {
      translate([
        width_mm / -2,
        height_mm / -2,
        0,
      ]) {
        cube([
          width_mm,
          height_mm,
          depth_mm,
        ]);
      };
    } else if (border_type == "rounded_flat") {
      border_thickness_mm = dictionary_get(border, "thickness_mm");
      border_sides = dictionary_get(border, "sides");

      linear_extrude(depth_mm) {
        hull() {
          translate([
            width_mm / -2 + border_thickness_mm,
            height_mm / -2 + border_thickness_mm,
          ]) {
            circle(r = border_thickness_mm, $fn = border_sides);
          };

          translate([
            width_mm / 2 - border_thickness_mm,
            height_mm / -2 + border_thickness_mm,
          ]) {
            circle(r = border_thickness_mm, $fn = border_sides);
          };

          translate([
            width_mm / -2 + border_thickness_mm,
            height_mm / 2 - border_thickness_mm,
          ]) {
            circle(r = border_thickness_mm, $fn = border_sides);
          };

          translate([
            width_mm / 2 - border_thickness_mm,
            height_mm / 2 - border_thickness_mm,
          ]) {
            circle(r = border_thickness_mm, $fn = border_sides);
          };
        };
      };
    } else {
      assert(false, "Unexpected inlay type");
    };

    backing_apeture_width_mm = backing_width_mm - backing_lip_thickness_mm() * 2;
    backing_apeture_height_mm = backing_height_mm - backing_lip_thickness_mm() * 2;

    translate([
      backing_apeture_width_mm / -2,
      backing_apeture_height_mm / -2,
      0,
    ]) {
      cube([
        backing_apeture_width_mm,
        backing_apeture_height_mm,
        backing_lip_depth_mm() - backing_lip_slope_depth_mm(),
      ]);
    };

    hull() {
      translate([
        backing_apeture_width_mm / -2,
        backing_apeture_height_mm / -2,
        backing_lip_depth_mm() - backing_lip_slope_depth_mm(),
      ]) {
        cube([
          backing_apeture_width_mm,
          backing_apeture_height_mm,
          backing_lip_slope_depth_mm(),
        ]);
      };

      translate([
        backing_width_mm / -2,
        backing_height_mm / -2,
        backing_lip_depth_mm(),
      ]) {
        cube([
          backing_width_mm,
          backing_height_mm,
          backing_depth_mm,
        ]);
      };
    };

    translate([
      backing_width_mm / -2,
      backing_height_mm / -2,
      backing_lip_depth_mm(),
    ]) {
      cube([
        backing_width_mm,
        backing_height_mm,
        backing_depth_mm,
      ]);
    };

    translate([
      inlay_width_mm / -2,
      inlay_height_mm / -2,
      backing_lip_depth_mm() + backing_depth_mm,
    ]) {
      cube([
        backing_width_mm,
        backing_height_mm,
        inlay_bottom_depth_mm()
          + greatest_inlay_embed_depth_mm
          + greatest_inlay_protrusion_depth_mm
          + inlay_top_clearance_mm(),
      ]);
    };

    translate([
      glazing_width_mm / -2,
      glazing_height_mm / -2,
      depth_mm - glazing_lip_depth_mm() - glazing_depth_mm,
    ]) {
      cube([
        glazing_width_mm,
        glazing_height_mm,
        glazing_depth_mm,
      ]);
    };

    glazing_apeture_width_mm = glazing_width_mm - glazing_lip_thickness_mm() * 2;
    glazing_apeture_height_mm = glazing_height_mm - glazing_lip_thickness_mm() * 2;

    translate([
      glazing_apeture_width_mm / -2,
      glazing_apeture_height_mm / -2,
      depth_mm - glazing_lip_depth_mm(),
    ]) {
      cube([
        glazing_apeture_width_mm,
        glazing_apeture_height_mm,
        glazing_lip_depth_mm(),
      ]);
    };
  };
};
// main file
use <../frame.scad>;
use <../inlay.scad>;
use <../glazings/a4_glazing.scad>;
use <../backings/a4_backing.scad>;
use <../borders/rounded_flat_border.scad>;
use <../inlays/nintendo_ds_game_card_inlay.scad>;
use <../../utilities/slice_x.scad>;
use <../../utilities/slice_y.scad>;

settings = [
  ["glazing", a4_glazing()],
  ["backing", a4_backing()],
  [
    "border",
    rounded_flat_border([
      ["thickness_mm", 17.5],
      ["sides", 256],
    ]),
  ],
  [
    "inlays", [
      nintendo_ds_game_card_inlay([
        [
          "origin", [
            ["x_mm", -91],
            ["y_mm", -64],
          ],
        ],
      ]),
      nintendo_ds_game_card_inlay([
        [
          "origin", [
            ["x_mm", -91],
            ["y_mm", 64],
          ],
        ],
      ]),
      nintendo_ds_game_card_inlay([
        [
          "origin", [
            ["x_mm", -91],
            ["y_mm", 0],
          ],
        ],
      ]),      
      nintendo_ds_game_card_inlay([
        [
          "origin", [
            ["x_mm", -30.33333333333333],
            ["y_mm", -64],
          ],
        ],
      ]),
      nintendo_ds_game_card_inlay([
        [
          "origin", [
            ["x_mm", -30.33333333333333],
            ["y_mm", 64],
          ],
        ],
      ]),
      nintendo_ds_game_card_inlay([
        [
          "origin", [
            ["x_mm", -30.33333333333333],
            ["y_mm", 0],
          ],
        ],
      ]),
      nintendo_ds_game_card_inlay([
        [
          "origin", [
            ["x_mm", 30.33333333333333],
            ["y_mm", -64],
          ],
        ],
      ]),
      nintendo_ds_game_card_inlay([
        [
          "origin", [
            ["x_mm", 30.33333333333333],
            ["y_mm", 64],
          ],
        ],
      ]),
      nintendo_ds_game_card_inlay([
        [
          "origin", [
            ["x_mm", 30.33333333333333],
            ["y_mm", 0],
          ],
        ],
      ]),
      nintendo_ds_game_card_inlay([
        [
          "origin", [
            ["x_mm", 91],
            ["y_mm", -64],
          ],
        ],
      ]),
      nintendo_ds_game_card_inlay([
        [
          "origin", [
            ["x_mm", 91],
            ["y_mm", 64],
          ],
        ],
      ]),
      nintendo_ds_game_card_inlay([
        [
          "origin", [
            ["x_mm", 91],
            ["y_mm", 0],
          ],
        ],
      ]),
    ],
  ],
];

translate([-150, 0, 0]) {
  slice_x(-10000, 0) {
    frame(settings);
  };
};

translate([-10, 0, 0]) {
  slice_x(-10000, -60.66666666666667) {
    inlay(settings);
  };
};

slice_x(-60.66666666666667, 60.66666666666667) {
  inlay(settings);
};

translate([10, 0, 0]) {
  slice_x(60.66666666666667, 10000) {
    inlay(settings);
  };
};

translate([150, 0, 0]) {
  slice_x(0, 10000) {
    frame(settings);
  };
};
